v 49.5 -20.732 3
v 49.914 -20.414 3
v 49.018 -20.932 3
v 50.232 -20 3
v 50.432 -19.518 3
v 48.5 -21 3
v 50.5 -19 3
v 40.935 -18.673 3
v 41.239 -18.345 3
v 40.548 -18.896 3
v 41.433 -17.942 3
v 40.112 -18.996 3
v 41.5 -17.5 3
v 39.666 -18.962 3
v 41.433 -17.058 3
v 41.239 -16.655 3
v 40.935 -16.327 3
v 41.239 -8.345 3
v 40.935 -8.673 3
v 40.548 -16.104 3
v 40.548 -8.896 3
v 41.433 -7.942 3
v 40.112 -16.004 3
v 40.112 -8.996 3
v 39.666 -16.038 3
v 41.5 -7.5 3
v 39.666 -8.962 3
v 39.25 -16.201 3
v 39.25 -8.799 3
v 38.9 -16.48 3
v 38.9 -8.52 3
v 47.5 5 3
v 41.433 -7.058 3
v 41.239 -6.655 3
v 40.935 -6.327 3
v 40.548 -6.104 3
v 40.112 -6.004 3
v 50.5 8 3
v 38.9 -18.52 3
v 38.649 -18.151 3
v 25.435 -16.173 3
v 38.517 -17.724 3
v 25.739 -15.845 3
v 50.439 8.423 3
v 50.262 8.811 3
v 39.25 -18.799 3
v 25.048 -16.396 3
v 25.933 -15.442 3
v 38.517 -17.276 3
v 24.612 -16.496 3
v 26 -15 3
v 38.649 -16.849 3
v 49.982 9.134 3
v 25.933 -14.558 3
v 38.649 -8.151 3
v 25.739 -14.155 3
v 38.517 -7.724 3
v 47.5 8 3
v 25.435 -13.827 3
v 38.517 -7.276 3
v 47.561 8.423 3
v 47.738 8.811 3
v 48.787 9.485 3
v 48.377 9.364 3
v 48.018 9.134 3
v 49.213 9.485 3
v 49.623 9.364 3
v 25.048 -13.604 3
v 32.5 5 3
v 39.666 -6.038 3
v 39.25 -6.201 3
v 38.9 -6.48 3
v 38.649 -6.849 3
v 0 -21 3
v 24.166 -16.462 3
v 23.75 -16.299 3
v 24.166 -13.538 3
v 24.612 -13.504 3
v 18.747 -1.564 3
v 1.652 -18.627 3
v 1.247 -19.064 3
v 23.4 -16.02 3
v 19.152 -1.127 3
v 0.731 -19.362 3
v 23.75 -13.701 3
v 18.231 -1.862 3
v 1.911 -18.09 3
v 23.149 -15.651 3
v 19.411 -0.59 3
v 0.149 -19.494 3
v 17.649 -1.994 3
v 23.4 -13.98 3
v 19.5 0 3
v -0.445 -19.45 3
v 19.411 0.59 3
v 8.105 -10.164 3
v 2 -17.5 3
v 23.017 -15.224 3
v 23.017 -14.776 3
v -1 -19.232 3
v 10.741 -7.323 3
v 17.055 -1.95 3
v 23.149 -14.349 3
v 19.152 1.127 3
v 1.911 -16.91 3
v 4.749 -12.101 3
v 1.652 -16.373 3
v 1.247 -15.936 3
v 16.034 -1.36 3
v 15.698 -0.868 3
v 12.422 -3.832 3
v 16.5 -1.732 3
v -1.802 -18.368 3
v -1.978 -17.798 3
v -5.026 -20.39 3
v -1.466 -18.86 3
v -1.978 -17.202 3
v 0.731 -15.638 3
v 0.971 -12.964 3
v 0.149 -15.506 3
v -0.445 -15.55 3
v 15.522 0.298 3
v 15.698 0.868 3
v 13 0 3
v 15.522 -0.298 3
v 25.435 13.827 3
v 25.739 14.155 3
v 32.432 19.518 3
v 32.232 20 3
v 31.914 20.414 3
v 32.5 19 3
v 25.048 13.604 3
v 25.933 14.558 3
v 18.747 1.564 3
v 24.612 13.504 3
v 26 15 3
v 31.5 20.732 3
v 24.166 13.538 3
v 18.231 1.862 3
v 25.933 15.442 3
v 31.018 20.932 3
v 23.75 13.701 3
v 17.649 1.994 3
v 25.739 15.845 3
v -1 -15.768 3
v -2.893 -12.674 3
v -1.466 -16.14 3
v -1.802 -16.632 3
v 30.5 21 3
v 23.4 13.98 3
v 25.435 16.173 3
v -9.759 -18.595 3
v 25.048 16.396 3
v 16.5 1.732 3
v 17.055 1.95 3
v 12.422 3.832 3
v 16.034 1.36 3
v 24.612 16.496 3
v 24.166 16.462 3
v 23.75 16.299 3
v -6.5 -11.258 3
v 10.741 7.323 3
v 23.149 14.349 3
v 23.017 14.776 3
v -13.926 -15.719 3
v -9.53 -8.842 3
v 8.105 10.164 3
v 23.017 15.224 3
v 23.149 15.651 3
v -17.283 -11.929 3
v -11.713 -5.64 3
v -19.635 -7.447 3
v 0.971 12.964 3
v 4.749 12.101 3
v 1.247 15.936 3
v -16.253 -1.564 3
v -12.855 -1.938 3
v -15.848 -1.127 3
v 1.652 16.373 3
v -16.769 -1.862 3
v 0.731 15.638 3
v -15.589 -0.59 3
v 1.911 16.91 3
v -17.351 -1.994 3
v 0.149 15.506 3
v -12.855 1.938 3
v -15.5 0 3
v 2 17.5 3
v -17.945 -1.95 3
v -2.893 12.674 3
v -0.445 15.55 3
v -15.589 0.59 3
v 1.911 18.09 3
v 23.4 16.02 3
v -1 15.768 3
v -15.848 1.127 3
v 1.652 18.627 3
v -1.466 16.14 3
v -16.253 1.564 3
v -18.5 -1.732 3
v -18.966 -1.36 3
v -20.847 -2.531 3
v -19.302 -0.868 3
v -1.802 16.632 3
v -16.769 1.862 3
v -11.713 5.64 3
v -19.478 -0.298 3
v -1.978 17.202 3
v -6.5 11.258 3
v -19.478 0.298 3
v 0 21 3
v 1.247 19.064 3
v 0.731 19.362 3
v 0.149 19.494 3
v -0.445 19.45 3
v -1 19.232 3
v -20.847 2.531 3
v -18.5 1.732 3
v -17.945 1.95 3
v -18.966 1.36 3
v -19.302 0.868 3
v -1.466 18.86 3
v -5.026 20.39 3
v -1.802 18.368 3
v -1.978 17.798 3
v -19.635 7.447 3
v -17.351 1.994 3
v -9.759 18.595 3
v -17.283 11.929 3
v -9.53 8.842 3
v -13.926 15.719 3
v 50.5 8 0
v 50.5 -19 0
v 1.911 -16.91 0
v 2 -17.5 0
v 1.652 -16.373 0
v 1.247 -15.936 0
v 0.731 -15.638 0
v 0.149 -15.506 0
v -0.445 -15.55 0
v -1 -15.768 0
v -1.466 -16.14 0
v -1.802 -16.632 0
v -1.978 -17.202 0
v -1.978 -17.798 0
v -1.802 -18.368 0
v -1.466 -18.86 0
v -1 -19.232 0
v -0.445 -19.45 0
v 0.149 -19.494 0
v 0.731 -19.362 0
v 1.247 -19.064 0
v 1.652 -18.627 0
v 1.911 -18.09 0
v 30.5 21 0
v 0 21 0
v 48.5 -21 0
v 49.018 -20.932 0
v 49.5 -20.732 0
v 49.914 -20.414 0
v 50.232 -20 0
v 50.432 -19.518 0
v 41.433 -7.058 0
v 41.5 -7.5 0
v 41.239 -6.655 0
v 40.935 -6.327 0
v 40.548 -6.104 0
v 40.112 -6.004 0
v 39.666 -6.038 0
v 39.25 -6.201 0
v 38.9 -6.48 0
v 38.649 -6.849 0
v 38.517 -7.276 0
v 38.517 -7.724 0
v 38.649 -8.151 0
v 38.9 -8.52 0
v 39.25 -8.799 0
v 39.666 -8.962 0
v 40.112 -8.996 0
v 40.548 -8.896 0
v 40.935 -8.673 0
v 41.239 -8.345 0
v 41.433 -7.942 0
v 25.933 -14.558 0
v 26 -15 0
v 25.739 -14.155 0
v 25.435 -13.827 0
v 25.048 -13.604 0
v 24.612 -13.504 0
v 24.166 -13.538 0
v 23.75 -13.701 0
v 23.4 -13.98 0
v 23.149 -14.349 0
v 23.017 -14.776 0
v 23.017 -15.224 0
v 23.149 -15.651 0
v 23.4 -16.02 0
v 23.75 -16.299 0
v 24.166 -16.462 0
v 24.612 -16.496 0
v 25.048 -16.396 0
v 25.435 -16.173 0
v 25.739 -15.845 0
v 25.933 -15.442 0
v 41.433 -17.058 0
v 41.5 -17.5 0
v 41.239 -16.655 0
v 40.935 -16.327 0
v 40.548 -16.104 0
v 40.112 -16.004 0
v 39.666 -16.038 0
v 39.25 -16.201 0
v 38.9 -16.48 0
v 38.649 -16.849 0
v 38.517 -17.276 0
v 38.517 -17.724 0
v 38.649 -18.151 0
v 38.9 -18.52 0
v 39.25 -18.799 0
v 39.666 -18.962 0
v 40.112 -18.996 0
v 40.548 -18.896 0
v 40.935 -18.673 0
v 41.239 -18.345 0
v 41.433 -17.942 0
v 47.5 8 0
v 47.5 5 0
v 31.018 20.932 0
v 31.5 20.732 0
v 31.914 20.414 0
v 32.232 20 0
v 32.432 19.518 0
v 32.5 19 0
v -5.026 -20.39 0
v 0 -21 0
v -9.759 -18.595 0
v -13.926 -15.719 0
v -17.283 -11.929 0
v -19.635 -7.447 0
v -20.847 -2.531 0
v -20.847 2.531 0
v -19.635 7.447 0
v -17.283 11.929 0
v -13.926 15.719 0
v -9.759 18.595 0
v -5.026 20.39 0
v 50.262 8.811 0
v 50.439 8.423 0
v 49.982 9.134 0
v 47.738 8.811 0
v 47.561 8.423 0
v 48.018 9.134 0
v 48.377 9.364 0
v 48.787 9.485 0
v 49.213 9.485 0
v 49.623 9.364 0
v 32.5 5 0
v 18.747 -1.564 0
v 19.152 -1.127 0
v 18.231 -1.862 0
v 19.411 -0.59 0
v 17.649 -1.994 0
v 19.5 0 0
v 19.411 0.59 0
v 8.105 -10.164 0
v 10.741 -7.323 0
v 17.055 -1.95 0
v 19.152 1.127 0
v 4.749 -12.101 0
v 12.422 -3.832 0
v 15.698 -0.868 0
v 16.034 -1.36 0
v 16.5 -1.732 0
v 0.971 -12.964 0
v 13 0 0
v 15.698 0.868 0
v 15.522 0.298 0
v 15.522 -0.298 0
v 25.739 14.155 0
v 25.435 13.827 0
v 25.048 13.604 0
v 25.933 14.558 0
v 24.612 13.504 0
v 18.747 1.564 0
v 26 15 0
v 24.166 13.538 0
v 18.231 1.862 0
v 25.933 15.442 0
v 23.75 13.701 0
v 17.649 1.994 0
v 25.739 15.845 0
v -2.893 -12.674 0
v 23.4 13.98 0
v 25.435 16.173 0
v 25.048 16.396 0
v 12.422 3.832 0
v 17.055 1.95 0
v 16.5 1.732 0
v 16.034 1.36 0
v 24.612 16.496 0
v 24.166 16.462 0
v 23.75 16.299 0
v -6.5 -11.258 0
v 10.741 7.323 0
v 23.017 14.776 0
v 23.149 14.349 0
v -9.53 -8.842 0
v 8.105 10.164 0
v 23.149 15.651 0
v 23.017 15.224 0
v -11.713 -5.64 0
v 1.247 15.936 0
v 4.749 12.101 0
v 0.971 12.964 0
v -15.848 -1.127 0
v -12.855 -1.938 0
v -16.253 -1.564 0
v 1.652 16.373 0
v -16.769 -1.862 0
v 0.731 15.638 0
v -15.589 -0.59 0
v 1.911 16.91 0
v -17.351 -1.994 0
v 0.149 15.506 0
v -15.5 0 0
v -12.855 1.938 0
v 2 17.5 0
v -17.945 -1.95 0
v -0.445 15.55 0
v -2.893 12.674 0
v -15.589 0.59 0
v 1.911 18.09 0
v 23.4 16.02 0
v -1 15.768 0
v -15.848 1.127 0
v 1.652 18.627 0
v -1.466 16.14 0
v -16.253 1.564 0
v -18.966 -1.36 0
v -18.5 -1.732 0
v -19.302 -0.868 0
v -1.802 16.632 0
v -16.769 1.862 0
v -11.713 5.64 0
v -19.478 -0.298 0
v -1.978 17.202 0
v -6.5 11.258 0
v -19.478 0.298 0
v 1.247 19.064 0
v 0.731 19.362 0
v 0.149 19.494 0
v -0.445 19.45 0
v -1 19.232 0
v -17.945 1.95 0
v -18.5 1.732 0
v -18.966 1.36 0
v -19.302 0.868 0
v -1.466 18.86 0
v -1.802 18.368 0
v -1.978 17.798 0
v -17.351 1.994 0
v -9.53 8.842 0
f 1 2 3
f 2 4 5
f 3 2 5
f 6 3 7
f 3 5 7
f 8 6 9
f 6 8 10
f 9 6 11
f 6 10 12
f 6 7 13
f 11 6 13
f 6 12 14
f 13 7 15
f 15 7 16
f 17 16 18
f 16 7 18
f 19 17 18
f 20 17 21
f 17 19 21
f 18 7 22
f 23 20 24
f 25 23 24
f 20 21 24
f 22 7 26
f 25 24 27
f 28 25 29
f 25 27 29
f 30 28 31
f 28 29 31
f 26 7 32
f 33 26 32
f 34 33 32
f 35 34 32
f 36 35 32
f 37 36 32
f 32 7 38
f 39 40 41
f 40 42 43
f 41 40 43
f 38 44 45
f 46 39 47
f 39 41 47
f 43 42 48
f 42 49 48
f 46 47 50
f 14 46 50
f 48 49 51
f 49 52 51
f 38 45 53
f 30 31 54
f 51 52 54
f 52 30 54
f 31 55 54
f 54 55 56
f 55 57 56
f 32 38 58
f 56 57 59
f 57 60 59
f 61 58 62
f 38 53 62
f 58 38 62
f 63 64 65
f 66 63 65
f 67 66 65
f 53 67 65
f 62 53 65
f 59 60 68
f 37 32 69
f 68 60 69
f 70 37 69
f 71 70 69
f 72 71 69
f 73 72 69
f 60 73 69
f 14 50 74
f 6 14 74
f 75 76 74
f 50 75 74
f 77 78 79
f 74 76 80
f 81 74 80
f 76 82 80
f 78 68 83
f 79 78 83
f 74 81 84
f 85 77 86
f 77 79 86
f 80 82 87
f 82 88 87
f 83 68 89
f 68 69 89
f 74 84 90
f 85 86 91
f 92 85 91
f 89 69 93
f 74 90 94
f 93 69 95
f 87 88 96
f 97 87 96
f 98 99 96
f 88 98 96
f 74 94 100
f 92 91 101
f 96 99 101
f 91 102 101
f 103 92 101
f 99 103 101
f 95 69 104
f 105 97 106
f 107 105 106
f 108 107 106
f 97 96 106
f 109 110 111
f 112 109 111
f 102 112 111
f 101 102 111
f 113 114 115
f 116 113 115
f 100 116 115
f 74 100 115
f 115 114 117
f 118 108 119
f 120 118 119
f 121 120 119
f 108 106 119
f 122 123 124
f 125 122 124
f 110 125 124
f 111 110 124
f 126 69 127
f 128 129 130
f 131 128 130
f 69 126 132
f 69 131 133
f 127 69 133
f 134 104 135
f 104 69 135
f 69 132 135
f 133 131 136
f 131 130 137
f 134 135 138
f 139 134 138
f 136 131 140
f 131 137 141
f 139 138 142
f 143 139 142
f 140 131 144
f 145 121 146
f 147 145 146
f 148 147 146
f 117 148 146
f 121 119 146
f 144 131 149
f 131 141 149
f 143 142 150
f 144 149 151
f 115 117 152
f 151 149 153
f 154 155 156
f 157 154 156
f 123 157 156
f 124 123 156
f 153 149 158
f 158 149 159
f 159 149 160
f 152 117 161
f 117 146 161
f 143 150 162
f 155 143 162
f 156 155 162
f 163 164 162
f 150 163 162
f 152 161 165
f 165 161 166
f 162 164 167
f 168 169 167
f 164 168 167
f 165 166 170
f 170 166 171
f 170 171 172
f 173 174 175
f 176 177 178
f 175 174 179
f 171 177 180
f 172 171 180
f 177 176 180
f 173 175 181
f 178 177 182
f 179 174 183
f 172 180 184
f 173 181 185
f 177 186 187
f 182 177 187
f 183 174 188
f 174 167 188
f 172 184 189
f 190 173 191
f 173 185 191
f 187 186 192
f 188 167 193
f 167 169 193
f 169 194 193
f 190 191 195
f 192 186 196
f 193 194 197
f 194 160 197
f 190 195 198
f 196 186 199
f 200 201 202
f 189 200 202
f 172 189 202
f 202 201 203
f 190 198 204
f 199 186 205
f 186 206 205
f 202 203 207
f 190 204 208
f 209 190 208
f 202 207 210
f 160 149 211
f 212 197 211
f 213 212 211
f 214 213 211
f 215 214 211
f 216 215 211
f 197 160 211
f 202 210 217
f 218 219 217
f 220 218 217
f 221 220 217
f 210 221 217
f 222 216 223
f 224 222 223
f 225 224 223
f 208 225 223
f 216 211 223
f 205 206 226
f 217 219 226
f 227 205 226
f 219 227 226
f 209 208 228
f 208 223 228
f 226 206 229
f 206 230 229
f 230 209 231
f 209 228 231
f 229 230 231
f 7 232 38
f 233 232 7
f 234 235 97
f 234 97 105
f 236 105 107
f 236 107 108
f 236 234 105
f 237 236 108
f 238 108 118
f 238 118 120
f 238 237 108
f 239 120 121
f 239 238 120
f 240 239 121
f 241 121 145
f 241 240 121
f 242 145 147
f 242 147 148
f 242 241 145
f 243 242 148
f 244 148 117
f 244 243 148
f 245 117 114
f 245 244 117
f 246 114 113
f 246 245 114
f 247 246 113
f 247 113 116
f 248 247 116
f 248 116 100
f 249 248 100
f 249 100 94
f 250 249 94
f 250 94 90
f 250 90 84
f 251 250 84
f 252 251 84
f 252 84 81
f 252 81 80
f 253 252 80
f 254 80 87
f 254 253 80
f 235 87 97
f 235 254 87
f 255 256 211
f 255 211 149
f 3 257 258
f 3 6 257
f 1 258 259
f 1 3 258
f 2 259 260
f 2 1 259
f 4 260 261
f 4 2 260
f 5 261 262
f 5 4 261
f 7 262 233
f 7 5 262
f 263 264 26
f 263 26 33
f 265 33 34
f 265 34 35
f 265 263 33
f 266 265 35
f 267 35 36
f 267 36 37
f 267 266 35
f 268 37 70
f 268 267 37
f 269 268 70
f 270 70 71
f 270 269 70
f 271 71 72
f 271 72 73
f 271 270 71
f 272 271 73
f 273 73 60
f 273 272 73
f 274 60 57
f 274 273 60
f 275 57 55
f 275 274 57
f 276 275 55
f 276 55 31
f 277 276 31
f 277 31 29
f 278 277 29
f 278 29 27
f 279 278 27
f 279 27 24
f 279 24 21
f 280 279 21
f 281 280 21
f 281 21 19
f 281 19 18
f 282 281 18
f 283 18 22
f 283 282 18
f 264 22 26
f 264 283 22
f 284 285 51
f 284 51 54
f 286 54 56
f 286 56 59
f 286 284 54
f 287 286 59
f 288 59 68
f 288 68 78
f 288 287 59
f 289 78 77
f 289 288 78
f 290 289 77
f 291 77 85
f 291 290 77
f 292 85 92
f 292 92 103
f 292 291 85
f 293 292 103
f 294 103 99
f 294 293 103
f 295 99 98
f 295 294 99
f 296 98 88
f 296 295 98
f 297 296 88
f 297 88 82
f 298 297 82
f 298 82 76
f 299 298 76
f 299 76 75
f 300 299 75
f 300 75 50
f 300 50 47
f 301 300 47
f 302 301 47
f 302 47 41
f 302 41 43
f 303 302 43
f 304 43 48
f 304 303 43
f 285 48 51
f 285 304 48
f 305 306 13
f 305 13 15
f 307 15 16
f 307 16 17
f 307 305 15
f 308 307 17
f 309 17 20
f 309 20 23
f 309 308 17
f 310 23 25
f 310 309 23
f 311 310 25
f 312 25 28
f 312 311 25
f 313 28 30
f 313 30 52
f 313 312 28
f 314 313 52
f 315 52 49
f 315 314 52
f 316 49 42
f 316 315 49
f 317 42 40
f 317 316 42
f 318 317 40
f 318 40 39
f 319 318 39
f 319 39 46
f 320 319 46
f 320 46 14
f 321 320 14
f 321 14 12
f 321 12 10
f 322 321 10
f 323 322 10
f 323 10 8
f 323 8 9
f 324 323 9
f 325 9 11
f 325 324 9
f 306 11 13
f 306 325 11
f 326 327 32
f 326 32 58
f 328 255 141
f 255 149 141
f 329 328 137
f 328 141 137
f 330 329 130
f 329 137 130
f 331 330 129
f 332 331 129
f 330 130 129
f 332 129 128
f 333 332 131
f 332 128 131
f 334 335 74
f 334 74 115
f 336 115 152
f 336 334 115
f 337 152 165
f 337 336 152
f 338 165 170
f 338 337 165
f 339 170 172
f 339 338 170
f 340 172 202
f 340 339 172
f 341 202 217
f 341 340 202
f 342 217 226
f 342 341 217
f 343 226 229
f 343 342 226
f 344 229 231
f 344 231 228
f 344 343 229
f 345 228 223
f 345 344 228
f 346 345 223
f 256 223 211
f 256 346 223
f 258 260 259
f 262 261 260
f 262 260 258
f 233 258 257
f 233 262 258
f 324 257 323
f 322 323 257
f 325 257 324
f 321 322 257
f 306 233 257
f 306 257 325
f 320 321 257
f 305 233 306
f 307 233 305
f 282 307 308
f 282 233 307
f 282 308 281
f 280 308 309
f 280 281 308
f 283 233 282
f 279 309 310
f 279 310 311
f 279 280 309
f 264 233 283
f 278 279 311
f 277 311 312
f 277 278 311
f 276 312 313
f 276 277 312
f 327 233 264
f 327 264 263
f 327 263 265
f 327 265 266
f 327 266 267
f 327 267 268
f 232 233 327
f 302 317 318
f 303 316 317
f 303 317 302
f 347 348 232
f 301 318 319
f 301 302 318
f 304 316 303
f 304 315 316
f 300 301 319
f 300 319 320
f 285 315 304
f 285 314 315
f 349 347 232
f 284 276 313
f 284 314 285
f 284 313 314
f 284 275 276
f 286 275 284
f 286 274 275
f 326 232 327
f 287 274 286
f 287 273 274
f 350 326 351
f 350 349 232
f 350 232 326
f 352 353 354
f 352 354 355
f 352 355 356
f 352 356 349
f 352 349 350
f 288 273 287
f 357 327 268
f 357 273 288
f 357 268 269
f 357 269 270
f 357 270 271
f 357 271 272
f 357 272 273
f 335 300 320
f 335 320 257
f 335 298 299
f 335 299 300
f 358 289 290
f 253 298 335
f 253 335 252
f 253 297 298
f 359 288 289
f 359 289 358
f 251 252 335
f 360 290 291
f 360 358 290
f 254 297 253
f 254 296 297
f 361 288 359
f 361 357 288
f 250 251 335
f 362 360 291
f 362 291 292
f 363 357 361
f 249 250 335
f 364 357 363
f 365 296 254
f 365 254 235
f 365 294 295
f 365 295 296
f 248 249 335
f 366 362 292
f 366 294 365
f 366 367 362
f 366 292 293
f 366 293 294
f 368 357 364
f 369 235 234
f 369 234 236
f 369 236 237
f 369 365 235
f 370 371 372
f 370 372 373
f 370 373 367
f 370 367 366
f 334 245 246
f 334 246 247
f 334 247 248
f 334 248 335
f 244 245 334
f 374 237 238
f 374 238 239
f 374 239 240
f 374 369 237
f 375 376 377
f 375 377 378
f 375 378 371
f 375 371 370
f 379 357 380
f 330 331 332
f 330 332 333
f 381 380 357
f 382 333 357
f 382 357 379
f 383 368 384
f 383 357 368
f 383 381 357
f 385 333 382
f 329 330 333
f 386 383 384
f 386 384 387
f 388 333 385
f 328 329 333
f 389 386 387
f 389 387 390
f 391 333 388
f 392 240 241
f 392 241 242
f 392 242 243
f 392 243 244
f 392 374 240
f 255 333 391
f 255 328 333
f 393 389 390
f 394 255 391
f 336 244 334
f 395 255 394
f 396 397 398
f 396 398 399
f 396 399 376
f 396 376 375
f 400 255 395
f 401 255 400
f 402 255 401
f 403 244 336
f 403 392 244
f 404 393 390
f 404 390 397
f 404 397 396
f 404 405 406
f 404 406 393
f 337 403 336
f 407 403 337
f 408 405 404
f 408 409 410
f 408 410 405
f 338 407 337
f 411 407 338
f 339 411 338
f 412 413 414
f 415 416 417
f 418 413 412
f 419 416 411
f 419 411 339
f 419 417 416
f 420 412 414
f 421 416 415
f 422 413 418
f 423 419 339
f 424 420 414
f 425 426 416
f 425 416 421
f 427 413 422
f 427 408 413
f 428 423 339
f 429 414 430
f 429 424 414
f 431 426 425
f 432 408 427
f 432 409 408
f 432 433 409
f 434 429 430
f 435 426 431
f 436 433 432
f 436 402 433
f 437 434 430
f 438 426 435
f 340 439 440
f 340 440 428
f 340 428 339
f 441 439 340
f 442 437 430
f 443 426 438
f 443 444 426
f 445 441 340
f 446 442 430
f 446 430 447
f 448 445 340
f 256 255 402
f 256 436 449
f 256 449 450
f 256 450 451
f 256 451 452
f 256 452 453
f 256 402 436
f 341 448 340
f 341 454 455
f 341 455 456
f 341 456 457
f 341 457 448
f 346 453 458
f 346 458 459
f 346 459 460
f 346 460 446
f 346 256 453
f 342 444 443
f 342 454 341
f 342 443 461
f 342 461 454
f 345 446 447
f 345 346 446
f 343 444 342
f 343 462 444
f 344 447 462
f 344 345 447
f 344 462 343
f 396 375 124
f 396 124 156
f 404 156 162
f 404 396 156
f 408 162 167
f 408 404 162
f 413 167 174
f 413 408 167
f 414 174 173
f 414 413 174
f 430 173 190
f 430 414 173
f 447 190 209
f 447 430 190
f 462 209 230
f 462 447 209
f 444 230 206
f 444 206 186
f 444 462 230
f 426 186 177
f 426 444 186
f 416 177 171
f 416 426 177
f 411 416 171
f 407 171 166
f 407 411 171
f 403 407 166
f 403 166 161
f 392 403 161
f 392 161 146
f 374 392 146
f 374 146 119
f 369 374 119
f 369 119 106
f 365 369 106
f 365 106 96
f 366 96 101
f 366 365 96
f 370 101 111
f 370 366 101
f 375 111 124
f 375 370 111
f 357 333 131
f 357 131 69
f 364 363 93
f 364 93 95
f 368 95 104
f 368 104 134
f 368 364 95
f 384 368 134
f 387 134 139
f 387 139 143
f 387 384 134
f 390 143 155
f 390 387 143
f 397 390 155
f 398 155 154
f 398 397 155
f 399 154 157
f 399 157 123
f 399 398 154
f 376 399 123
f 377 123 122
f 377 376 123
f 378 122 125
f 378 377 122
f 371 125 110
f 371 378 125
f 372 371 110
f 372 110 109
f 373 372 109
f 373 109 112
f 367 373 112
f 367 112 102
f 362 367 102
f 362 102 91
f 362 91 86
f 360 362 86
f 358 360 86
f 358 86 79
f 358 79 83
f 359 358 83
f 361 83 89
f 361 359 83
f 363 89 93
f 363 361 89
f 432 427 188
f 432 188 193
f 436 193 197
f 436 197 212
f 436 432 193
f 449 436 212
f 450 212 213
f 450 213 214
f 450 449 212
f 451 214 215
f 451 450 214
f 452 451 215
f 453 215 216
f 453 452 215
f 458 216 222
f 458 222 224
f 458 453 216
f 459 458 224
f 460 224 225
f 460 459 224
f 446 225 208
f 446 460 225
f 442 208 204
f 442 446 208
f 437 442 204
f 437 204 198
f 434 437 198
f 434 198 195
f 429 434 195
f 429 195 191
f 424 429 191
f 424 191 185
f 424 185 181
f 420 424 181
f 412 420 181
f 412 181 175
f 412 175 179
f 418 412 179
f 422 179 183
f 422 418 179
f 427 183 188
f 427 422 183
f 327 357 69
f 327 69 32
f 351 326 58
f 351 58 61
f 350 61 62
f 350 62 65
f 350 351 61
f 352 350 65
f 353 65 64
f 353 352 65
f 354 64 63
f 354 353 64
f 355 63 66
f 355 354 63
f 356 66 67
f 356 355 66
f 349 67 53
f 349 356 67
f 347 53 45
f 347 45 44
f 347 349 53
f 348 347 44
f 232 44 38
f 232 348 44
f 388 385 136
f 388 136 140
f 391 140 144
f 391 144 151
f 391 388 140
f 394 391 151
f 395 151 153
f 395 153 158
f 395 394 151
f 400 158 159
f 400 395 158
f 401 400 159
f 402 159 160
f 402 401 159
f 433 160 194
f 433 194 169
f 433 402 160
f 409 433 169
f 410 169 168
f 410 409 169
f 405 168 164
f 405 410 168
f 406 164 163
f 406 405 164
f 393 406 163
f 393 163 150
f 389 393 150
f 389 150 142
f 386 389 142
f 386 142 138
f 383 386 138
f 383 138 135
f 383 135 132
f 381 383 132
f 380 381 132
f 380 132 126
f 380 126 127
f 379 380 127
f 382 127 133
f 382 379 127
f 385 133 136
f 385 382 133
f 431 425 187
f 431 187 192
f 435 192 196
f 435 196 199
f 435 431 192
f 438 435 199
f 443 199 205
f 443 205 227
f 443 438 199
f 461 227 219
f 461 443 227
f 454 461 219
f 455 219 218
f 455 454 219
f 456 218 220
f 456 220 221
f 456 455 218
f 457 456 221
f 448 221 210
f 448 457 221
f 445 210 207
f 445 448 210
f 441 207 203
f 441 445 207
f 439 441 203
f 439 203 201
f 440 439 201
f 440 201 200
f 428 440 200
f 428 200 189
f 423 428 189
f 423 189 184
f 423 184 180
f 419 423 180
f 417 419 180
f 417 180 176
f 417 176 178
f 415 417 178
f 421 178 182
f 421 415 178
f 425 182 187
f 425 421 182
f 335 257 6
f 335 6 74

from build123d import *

# Parameters (mm, degrees)
SKETCH_1_R      = 13
SKETCH_1_R_2    = 2
SKETCH_1_R_3    = 1.5
EXTRUDE_1_DEPTH = 3
FILLET_1_R      = 2


with BuildPart() as part:
    # 草图1 → 凸台-拉伸1 (new body)
    with BuildSketch(Plane.XY):
        with BuildLine():
            Line((0, 21), (32.5, 21))
            Line((32.5, 21), (32.5, 5))
            Line((32.5, 5), (47.5, 5))
            Line((47.5, 5), (47.5, 8))
            ThreePointArc((47.5, 8), (49, 9.5), (50.5, 8))
            Line((50.5, 8), (50.5, -21))
            Line((50.5, -21), (0, -21))
            ThreePointArc((0, -21), (-21, 0), (0, 21))
        make_face()
        Circle(SKETCH_1_R, mode=Mode.SUBTRACT)
        with Locations((17.5, 0)):
            Circle(SKETCH_1_R_2, mode=Mode.SUBTRACT)
        with Locations((0, -17.5)):
            Circle(SKETCH_1_R_2, mode=Mode.SUBTRACT)
        with Locations((-17.5, 0)):
            Circle(SKETCH_1_R_2, mode=Mode.SUBTRACT)
        with Locations((0, 17.5)):
            Circle(SKETCH_1_R_2, mode=Mode.SUBTRACT)
        with Locations((40, -7.5)):
            Circle(SKETCH_1_R_3, mode=Mode.SUBTRACT)
        with Locations((40, -17.5)):
            Circle(SKETCH_1_R_3, mode=Mode.SUBTRACT)
        with Locations((24.5, 15)):
            Circle(SKETCH_1_R_3, mode=Mode.SUBTRACT)
        with Locations((24.5, -15)):
            Circle(SKETCH_1_R_3, mode=Mode.SUBTRACT)
    extrude(amount=EXTRUDE_1_DEPTH)

    # 圆角1
    fillet_1_edges = [part.edges().sort_by_distance(p)[0] for p in [
        (32.5, 21, 1.5),
        (50.5, -21, 1.5),
    ]]
    fillet(fillet_1_edges, radius=FILLET_1_R)


solid = part.part
